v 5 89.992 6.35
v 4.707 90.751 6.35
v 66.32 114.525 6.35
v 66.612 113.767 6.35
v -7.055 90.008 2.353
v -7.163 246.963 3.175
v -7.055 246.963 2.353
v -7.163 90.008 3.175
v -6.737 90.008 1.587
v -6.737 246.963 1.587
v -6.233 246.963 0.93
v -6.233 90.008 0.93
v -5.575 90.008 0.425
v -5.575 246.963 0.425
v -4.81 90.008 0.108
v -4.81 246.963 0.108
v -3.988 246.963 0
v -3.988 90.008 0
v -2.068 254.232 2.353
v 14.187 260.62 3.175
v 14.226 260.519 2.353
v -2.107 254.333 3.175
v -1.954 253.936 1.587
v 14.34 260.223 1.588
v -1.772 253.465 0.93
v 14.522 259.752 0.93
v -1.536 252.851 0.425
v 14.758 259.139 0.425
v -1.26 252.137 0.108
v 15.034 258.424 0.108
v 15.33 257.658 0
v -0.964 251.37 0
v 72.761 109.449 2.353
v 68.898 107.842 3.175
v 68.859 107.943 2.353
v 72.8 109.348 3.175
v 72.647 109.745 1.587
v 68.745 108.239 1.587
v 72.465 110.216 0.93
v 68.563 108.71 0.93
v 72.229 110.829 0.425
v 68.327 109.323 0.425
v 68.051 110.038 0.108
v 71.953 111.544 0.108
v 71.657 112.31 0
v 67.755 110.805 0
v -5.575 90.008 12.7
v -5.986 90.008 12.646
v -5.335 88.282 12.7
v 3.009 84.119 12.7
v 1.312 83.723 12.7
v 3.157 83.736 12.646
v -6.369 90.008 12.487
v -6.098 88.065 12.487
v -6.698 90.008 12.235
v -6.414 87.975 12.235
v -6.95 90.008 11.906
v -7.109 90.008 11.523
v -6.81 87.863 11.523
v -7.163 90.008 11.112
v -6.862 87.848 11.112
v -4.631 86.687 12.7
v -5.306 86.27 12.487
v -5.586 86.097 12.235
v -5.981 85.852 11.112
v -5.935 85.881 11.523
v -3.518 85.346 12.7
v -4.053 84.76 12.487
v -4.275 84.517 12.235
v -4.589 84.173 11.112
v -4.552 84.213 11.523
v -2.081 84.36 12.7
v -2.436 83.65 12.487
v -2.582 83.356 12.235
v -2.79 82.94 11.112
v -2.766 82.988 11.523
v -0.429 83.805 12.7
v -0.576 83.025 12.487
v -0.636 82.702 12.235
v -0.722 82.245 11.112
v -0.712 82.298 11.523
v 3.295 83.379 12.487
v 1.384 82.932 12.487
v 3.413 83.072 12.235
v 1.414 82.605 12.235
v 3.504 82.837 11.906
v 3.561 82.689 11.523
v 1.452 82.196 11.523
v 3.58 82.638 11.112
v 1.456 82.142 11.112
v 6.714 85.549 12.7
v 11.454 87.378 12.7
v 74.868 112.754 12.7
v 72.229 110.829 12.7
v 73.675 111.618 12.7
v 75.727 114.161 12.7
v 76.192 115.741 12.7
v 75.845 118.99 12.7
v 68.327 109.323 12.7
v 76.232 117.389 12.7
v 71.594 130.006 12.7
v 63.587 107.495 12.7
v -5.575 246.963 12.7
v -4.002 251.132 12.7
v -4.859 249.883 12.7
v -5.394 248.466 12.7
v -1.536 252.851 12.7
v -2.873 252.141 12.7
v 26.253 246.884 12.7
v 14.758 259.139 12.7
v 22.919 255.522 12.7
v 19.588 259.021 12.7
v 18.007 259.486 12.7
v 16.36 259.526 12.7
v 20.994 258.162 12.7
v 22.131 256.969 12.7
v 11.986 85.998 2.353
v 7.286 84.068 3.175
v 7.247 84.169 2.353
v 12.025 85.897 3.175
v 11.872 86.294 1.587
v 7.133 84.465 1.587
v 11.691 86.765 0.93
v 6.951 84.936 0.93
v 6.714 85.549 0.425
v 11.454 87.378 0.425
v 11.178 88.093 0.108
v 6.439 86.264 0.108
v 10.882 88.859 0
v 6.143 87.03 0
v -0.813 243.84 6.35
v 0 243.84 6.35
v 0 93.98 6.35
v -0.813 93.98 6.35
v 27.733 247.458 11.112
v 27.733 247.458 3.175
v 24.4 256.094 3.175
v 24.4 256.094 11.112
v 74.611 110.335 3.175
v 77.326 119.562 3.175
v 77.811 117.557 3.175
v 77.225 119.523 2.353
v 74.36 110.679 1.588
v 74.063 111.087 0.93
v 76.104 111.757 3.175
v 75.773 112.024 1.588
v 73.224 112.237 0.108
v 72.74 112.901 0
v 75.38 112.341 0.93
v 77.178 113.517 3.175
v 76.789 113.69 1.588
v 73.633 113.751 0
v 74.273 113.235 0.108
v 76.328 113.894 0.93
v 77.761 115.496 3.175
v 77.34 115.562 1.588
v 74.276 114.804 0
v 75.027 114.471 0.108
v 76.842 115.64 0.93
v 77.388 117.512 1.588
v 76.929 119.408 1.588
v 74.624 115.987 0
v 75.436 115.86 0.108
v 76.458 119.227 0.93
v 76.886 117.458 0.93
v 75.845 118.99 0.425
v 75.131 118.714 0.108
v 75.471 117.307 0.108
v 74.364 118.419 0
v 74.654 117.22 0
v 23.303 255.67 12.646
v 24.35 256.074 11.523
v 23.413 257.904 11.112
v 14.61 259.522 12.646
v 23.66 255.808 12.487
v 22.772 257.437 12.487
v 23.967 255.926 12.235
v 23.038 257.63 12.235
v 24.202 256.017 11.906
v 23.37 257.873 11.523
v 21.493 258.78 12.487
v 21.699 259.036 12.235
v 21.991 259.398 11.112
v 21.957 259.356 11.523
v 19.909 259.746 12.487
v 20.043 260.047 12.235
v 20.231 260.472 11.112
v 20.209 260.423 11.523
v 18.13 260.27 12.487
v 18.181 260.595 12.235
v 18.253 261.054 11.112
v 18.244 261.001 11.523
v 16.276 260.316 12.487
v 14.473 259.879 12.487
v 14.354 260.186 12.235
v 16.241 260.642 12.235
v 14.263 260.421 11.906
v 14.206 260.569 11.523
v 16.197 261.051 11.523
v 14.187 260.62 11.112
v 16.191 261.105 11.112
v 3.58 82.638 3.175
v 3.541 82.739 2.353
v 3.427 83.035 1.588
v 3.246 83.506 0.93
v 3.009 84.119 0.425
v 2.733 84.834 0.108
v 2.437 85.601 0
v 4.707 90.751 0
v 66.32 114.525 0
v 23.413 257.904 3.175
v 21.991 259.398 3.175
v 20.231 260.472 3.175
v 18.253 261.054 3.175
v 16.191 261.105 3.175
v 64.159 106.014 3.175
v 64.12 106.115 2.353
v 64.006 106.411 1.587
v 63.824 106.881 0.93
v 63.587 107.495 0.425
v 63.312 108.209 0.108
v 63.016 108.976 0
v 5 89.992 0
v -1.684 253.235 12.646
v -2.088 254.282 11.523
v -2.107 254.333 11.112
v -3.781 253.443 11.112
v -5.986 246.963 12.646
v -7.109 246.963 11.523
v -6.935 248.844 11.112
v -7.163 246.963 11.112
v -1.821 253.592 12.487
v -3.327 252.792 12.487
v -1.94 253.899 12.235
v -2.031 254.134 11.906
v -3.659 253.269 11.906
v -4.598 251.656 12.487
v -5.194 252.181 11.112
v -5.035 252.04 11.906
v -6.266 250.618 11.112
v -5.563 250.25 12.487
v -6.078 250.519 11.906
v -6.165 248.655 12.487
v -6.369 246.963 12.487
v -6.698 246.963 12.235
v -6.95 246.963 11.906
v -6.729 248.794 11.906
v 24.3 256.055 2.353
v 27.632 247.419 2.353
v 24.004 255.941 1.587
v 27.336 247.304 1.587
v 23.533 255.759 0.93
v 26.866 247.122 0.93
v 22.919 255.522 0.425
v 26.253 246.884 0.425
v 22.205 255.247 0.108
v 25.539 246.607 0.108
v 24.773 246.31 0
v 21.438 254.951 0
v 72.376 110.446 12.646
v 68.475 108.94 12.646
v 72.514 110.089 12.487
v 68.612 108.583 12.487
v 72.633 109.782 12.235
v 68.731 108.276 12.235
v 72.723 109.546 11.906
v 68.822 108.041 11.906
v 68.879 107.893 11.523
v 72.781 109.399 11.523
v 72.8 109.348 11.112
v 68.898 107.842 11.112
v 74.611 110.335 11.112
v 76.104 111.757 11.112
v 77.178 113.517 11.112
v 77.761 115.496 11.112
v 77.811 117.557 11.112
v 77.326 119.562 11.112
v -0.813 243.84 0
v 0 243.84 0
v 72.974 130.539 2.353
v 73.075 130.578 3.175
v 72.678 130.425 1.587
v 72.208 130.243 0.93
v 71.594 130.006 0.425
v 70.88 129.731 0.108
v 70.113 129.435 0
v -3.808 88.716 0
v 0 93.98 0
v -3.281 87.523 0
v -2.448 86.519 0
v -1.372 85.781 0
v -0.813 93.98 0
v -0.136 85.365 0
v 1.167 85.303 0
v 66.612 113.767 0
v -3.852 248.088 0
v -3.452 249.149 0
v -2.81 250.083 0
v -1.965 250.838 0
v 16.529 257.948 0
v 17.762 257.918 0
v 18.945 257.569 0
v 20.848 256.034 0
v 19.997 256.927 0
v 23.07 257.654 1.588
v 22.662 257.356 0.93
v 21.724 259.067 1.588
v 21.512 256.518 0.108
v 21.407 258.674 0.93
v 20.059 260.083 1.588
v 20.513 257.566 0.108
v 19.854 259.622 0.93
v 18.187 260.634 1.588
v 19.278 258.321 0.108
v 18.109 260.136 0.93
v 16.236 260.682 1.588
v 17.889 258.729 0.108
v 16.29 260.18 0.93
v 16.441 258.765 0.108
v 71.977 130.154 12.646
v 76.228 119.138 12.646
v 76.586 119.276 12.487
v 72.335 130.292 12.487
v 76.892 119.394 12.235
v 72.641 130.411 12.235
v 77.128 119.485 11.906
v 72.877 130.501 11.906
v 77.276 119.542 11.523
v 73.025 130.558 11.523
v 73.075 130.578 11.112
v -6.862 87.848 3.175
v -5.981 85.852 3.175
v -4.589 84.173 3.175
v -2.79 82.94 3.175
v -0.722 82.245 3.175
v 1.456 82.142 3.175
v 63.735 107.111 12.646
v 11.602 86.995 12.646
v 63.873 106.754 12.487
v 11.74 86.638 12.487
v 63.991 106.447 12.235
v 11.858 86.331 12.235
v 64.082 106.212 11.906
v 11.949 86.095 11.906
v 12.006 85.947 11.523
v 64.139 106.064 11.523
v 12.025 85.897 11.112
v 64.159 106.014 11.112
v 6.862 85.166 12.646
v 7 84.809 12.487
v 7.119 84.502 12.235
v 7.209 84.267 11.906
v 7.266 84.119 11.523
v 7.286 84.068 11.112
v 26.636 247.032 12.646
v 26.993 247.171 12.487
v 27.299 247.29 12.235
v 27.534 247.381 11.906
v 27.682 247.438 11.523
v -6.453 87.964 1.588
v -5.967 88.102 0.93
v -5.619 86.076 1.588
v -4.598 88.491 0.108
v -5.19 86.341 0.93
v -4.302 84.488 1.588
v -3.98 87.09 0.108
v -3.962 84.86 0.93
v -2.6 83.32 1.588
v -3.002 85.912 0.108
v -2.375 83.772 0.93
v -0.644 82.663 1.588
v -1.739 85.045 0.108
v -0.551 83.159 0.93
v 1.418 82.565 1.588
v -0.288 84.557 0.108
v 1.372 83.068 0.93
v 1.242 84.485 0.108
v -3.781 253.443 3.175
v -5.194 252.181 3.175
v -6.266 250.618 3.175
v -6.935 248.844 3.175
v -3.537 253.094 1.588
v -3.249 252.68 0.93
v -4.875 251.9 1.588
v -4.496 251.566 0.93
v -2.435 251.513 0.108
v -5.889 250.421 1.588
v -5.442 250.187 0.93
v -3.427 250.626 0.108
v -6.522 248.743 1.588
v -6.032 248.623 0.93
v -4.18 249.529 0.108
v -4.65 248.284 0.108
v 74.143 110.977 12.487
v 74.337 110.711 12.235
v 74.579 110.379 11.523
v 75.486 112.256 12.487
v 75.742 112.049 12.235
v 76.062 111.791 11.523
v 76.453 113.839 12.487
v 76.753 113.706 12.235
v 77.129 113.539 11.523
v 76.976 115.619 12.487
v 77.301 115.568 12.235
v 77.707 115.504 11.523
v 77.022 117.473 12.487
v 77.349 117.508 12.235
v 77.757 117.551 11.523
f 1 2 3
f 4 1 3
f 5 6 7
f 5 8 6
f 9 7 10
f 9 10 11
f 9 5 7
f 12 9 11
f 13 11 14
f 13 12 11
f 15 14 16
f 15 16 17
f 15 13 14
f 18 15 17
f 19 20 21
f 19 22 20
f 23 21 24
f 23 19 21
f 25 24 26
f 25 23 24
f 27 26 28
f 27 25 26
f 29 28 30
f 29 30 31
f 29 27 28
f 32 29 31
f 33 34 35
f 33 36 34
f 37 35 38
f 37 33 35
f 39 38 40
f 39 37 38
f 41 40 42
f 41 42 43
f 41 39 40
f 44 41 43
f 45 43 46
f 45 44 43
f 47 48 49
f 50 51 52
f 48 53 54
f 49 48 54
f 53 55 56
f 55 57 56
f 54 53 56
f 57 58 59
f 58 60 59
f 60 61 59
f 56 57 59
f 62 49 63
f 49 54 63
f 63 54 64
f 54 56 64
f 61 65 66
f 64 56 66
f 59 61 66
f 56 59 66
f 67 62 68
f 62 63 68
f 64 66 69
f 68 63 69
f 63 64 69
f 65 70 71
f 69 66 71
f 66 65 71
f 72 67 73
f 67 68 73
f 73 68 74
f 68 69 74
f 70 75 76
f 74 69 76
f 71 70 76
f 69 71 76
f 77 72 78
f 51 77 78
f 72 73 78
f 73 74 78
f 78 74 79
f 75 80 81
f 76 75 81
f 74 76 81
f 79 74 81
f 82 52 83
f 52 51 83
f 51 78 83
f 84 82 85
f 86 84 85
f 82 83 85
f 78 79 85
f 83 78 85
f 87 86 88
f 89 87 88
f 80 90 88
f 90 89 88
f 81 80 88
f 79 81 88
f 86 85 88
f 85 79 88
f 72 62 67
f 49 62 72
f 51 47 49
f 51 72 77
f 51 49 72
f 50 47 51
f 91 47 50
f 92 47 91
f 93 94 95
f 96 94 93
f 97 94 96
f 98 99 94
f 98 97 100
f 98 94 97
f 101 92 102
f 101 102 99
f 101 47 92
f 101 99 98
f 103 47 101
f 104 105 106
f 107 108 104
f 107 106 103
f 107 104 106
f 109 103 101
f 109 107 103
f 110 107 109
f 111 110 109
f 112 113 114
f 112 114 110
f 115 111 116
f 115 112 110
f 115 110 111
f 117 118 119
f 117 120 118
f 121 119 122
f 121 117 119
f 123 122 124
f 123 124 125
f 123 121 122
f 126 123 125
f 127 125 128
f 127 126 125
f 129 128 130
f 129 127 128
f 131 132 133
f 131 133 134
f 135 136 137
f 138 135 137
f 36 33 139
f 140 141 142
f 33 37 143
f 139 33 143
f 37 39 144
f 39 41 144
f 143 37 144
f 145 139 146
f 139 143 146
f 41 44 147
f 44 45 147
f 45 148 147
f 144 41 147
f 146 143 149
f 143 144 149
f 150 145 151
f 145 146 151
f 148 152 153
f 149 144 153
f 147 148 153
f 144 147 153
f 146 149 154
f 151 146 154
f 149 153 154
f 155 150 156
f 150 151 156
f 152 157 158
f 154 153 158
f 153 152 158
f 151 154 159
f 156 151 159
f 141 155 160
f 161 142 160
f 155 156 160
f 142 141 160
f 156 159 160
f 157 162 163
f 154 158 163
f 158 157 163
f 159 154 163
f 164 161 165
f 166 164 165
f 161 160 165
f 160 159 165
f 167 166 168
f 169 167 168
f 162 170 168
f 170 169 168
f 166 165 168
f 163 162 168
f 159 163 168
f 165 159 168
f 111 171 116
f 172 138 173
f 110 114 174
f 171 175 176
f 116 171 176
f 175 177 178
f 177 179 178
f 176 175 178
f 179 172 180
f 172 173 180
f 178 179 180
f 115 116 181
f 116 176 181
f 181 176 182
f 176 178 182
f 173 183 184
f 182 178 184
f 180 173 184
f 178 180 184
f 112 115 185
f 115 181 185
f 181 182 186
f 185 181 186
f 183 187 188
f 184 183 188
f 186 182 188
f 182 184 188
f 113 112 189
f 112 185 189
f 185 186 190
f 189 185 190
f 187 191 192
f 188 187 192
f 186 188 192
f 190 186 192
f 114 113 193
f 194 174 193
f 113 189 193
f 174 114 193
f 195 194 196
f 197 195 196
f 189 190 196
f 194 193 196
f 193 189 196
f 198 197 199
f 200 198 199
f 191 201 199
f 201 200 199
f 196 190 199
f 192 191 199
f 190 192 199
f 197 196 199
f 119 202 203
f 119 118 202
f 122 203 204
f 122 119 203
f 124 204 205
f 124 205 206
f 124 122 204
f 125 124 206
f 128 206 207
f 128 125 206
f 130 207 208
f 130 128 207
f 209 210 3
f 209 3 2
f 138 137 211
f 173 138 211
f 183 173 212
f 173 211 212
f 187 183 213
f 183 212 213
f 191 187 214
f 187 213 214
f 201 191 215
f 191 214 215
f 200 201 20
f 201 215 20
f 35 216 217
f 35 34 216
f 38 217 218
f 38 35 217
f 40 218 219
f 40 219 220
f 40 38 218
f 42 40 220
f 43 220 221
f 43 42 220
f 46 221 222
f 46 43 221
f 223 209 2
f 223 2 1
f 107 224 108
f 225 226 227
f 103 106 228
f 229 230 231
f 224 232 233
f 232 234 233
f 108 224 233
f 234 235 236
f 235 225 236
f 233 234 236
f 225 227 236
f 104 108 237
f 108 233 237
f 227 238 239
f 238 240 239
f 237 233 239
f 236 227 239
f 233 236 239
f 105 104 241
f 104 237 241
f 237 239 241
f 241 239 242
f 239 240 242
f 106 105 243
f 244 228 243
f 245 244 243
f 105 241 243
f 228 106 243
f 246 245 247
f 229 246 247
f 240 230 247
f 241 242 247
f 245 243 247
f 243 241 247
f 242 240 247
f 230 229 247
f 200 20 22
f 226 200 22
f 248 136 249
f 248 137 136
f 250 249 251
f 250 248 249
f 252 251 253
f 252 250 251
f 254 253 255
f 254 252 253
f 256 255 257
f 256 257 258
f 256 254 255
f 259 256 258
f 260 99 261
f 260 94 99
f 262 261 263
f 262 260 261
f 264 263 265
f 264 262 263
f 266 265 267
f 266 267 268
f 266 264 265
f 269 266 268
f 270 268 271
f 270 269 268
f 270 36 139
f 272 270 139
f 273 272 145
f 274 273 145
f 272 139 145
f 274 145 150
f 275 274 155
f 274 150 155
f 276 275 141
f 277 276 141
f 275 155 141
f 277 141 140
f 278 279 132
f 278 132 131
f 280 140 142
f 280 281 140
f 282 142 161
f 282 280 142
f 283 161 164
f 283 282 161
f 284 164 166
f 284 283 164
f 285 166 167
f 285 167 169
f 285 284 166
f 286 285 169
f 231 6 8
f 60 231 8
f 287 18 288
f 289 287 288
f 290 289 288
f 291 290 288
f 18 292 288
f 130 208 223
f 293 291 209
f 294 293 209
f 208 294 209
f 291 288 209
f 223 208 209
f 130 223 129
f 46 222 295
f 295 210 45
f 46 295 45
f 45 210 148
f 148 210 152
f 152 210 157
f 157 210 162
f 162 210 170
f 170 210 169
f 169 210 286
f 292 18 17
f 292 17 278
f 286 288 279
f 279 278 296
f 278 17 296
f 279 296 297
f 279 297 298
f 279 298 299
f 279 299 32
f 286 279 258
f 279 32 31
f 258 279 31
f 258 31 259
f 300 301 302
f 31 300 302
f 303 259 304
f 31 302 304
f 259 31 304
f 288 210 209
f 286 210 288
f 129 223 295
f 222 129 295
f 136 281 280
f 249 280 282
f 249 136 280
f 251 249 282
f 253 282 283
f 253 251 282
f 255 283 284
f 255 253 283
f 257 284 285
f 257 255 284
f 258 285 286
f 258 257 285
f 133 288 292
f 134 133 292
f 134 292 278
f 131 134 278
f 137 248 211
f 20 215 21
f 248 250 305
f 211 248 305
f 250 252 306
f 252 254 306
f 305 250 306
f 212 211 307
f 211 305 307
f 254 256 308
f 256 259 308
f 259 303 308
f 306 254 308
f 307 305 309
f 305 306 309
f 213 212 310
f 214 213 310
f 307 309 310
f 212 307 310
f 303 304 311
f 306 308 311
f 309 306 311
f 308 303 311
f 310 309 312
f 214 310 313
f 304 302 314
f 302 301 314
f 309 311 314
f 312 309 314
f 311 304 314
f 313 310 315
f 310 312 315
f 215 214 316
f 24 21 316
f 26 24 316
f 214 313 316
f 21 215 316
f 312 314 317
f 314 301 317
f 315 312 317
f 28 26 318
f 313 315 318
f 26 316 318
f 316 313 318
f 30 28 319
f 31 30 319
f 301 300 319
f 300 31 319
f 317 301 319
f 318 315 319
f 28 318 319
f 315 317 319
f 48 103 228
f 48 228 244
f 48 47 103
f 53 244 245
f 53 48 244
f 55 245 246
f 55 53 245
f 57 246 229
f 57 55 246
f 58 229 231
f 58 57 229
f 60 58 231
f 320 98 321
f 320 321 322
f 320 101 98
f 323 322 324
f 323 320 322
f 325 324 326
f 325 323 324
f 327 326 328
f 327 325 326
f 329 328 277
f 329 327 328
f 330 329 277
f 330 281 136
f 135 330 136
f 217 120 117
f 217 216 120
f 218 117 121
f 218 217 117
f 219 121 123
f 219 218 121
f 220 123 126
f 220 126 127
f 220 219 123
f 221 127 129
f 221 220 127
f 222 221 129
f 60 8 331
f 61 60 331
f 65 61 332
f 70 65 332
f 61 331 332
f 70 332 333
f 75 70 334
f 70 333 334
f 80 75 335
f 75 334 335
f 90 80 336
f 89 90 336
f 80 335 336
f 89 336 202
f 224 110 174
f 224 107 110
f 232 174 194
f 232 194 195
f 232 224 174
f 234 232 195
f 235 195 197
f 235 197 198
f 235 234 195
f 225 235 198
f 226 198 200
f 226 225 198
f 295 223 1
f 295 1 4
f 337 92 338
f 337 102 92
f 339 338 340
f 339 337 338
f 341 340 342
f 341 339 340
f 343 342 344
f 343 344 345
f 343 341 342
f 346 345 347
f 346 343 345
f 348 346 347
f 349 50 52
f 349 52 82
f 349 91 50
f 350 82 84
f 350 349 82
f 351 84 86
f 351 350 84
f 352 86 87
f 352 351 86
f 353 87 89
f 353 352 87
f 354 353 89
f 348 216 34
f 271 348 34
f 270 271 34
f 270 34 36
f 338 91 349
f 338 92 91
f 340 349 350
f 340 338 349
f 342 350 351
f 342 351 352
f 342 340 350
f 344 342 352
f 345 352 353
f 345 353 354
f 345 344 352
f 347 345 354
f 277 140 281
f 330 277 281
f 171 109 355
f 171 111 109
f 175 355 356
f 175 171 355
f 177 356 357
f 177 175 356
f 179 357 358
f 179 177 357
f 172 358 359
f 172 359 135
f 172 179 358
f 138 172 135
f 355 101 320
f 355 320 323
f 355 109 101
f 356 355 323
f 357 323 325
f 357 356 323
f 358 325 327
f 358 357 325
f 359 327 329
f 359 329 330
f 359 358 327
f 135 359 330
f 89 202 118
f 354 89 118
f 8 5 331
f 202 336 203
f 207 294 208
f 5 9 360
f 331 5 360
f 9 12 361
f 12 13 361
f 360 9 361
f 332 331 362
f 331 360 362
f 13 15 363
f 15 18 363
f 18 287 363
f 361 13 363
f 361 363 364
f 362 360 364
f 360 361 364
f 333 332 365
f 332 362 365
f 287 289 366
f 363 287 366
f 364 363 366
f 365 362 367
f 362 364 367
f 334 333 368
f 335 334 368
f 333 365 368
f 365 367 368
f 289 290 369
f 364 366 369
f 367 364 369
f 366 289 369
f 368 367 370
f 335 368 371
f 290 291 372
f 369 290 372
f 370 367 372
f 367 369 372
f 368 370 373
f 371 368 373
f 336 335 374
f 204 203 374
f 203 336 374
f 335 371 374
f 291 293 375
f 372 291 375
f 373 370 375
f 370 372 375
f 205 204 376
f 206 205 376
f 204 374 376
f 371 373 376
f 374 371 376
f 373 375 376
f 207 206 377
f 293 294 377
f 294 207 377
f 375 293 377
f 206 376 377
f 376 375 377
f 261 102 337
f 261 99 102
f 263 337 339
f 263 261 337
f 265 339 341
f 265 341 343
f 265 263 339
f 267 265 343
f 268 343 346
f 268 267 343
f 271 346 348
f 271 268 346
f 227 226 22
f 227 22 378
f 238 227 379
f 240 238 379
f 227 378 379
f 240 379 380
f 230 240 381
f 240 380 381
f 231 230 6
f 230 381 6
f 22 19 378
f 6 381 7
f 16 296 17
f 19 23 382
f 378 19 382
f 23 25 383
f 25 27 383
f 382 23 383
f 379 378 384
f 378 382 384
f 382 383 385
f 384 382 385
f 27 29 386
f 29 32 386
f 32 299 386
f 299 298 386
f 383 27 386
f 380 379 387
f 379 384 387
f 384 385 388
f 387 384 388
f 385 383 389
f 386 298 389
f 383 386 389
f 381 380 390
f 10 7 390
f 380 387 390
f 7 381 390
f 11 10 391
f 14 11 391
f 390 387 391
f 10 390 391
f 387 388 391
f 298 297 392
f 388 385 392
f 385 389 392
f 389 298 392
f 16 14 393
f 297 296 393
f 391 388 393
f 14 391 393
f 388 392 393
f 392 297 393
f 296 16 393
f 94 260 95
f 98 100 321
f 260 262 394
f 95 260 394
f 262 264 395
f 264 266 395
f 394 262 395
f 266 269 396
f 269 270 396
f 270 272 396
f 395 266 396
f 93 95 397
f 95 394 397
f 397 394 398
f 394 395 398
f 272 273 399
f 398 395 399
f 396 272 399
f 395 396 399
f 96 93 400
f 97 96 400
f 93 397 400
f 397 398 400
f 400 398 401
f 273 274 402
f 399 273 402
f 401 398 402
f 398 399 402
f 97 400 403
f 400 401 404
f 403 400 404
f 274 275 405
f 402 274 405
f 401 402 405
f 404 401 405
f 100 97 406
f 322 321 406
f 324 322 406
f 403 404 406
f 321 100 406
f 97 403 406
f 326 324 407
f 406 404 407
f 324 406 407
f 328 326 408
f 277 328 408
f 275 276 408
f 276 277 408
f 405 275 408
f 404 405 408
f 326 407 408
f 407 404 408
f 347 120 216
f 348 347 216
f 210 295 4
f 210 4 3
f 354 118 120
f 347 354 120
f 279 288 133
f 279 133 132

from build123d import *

# Parameters (mm, degrees)
BOSS_EXTRUDE1_DEPTH = 12.7
FILLET1_R           = 3.175
FILLET2_R           = 1.5875
SKETCH3_W           = 0.8128
SKETCH3_H           = 149.86
CUT_EXTRUDE1_DEPTH  = 6.35
CUT_EXTRUDE2_DEPTH  = 6.35


with BuildPart() as part:
    # Sketch1 → Boss-Extrude1 (new body)
    with BuildSketch(Plane.XY):
        with BuildLine():
            Line((73.075190052, 130.577903395), (27.7327817, 247.457923548))
            Line((27.7327817, 247.457923548), (24.400446704, 256.093871545))
            ThreePointArc((24.400446704, 256.093871545), (20.231049001, 260.472170453), (14.186914765, 260.619885912))
            Line((14.186914765, 260.619885912), (-2.107158786, 254.332526198))
            ThreePointArc((-2.107158786, 254.332526198), (-5.777404472, 251.431339634), (-7.1628, 246.962753045))
            Line((-7.1628, 246.962753045), (-7.1628, 243.84))
            Line((-7.1628, 243.84), (-7.1628, 238.76))
            Line((-7.1628, 238.76), (-7.1628, 99.06))
            Line((-7.1628, 99.06), (-7.1628, 93.98))
            Line((-7.1628, 93.98), (-7.1628, 90.008173247))
            ThreePointArc((-7.1628, 90.008173247), (-3.731986589, 83.494168775), (3.580358786, 82.638400094))
            Line((3.580358786, 82.638400094), (7.285888595, 84.068245047))
            Line((7.285888595, 84.068245047), (12.025292552, 85.897028832))
            Line((12.025292552, 85.897028832), (64.158736078, 106.01365047))
            Line((64.158736078, 106.01365047), (68.898140035, 107.842434255))
            Line((68.898140035, 107.842434255), (72.80002218, 109.34804527))
            ThreePointArc((72.80002218, 109.34804527), (77.178321088, 113.517442972), (77.326036547, 119.561577209))
            Line((77.326036547, 119.561577209), (73.075190052, 130.577903395))
        make_face()
    extrude(amount=BOSS_EXTRUDE1_DEPTH)

    # Fillet1
    fillet1_edges = [part.edges().sort_by_distance(p)[0] for p in [
        (-7.1628, 168.485463146, 0),
        (-3.731986589, 83.494168775, 0),
        (38.190190483, 95.993222682, 0),
        (77.178321088, 113.517442972, 0),
        (75.200613299, 125.069740302, 0),
        (50.403985876, 189.017913472, 0),
        (26.066614202, 251.775897547, 0),
        (20.231049001, 260.472170453, 0),
        (6.039877989, 257.476206055, 0),
        (-5.777404472, 251.431339634, 0),
    ]]
    fillet(fillet1_edges, radius=FILLET1_R)

    # Fillet2
    fillet2_edges = [part.edges().sort_by_distance(p)[0] for p in [
        (-5.777404472, 251.431339634, 12.7),
        (6.039877989, 257.476206055, 12.7),
        (20.231049001, 260.472170453, 12.7),
        (26.066614202, 251.775897547, 12.7),
        (50.403985876, 189.017913472, 12.7),
        (75.200613299, 125.069740302, 12.7),
        (77.178321088, 113.517442972, 12.7),
        (38.190190483, 95.993222682, 12.7),
        (-7.1628, 168.485463146, 12.7),
        (-3.731986589, 83.494168775, 12.7),
    ]]
    fillet(fillet2_edges, radius=FILLET2_R)

    # Sketch3 → Cut-Extrude1 (cut)
    with BuildSketch(Plane(origin=(0, 0, 0), x_dir=(-1, 0, 0), z_dir=(0, 0, -1))):
        with Locations((0.4064, 168.91)):
            Rectangle(SKETCH3_W, SKETCH3_H)
    extrude(amount=-CUT_EXTRUDE1_DEPTH, mode=Mode.SUBTRACT)

    # Sketch4 → Cut-Extrude2 (cut)
    with BuildSketch(Plane(origin=(0, 0, 0), x_dir=(-1, 0, 0), z_dir=(0, 0, -1))):
        Polygon((-66.319554898, 114.524993835), (-4.707303458, 90.750804626), (-4.999908864, 89.992499993), (-66.612160304, 113.766689202), align=None)
    extrude(amount=-CUT_EXTRUDE2_DEPTH, mode=Mode.SUBTRACT)


solid = part.part
